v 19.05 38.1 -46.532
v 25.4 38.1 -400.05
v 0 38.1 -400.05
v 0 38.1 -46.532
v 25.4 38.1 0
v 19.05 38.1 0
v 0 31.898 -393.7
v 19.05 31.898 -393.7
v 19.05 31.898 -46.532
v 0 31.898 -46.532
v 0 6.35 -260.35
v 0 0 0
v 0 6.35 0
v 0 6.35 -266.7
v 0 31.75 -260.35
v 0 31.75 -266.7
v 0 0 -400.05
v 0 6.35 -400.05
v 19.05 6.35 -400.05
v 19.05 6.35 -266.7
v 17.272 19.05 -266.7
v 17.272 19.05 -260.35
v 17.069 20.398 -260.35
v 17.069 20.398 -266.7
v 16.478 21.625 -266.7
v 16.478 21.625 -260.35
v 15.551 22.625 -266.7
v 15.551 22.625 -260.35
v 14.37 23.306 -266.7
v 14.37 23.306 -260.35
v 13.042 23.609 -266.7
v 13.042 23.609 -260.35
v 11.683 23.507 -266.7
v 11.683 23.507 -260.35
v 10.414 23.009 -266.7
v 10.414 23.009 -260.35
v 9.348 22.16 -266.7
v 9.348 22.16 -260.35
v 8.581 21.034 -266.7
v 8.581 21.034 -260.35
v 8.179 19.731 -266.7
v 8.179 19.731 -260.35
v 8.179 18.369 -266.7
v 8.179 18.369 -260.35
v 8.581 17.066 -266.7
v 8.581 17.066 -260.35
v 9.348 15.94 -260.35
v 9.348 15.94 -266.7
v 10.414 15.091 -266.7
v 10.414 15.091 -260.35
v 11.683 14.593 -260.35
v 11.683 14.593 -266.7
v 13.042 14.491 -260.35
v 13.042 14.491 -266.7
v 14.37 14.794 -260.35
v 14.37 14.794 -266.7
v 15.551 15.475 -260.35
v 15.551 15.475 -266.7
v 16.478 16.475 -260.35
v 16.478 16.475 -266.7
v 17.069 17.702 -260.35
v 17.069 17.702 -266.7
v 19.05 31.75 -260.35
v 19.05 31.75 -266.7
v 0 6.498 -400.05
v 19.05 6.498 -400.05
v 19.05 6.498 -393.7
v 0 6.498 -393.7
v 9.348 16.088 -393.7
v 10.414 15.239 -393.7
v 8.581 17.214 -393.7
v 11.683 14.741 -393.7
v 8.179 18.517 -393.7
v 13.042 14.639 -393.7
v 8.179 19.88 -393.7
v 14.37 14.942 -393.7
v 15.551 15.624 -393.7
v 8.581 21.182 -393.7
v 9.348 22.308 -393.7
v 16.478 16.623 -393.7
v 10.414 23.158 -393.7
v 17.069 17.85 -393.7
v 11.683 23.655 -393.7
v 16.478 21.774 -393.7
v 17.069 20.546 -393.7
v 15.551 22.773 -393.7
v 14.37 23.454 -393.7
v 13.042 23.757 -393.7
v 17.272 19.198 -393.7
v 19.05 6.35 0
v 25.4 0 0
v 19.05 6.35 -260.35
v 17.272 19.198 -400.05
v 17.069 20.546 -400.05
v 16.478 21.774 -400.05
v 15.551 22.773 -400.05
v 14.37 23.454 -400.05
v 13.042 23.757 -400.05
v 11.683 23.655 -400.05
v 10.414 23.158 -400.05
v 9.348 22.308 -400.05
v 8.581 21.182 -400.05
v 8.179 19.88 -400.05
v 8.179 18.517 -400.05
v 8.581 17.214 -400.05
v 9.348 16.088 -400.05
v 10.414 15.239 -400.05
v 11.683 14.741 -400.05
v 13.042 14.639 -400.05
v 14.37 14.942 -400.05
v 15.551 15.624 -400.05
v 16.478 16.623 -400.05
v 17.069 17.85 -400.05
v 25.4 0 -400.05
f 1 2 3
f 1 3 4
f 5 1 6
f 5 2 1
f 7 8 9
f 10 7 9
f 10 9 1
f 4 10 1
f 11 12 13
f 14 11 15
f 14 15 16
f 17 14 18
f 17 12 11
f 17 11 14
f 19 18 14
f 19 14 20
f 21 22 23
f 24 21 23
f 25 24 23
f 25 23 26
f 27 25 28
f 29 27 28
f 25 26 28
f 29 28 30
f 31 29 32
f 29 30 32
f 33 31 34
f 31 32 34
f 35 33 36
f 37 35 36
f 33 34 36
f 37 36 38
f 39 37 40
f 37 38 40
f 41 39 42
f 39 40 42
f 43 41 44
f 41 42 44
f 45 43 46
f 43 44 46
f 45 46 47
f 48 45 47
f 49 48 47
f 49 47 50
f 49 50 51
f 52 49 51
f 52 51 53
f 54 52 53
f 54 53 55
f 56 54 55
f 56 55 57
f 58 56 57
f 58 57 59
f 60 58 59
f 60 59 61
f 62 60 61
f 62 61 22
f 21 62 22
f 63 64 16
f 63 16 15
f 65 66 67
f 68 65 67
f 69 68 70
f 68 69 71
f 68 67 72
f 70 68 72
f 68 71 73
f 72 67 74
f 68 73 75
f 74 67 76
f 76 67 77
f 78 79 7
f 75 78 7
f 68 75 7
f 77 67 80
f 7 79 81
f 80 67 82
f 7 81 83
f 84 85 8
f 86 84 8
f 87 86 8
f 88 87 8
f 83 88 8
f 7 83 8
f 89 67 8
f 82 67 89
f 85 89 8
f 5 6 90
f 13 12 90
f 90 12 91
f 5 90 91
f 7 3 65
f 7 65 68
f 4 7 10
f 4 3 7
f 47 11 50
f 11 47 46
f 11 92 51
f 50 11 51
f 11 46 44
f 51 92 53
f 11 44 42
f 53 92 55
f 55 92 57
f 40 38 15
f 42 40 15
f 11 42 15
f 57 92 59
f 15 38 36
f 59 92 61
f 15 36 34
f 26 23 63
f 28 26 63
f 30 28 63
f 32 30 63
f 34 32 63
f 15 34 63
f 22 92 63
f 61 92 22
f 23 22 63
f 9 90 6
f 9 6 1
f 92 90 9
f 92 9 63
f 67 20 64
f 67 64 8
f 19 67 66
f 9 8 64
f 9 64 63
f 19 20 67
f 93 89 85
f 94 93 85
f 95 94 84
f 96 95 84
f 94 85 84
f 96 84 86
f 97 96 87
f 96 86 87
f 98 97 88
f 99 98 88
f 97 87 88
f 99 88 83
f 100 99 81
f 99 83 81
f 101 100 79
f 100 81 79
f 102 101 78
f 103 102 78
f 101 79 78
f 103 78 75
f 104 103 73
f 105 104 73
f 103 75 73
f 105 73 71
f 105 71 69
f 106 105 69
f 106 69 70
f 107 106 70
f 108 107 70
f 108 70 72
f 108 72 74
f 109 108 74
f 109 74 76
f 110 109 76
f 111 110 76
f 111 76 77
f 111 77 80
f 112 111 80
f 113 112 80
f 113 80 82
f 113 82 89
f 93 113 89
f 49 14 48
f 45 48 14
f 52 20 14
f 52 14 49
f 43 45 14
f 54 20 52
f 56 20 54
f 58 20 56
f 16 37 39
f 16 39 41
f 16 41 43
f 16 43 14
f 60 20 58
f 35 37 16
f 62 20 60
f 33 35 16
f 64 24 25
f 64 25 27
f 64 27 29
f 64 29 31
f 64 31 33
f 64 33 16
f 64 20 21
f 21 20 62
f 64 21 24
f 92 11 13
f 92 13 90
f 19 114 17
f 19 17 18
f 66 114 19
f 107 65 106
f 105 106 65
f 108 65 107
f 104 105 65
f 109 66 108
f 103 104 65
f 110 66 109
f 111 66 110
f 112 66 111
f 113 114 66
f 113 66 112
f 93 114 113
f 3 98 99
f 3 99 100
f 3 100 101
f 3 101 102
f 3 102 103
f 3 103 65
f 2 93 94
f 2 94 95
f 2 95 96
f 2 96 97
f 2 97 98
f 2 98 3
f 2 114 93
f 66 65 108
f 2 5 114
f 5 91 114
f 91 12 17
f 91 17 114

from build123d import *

# Parameters (mm, degrees)
SKETCH2_W           = 25.4
SKETCH2_H           = 400.05
BOSS_EXTRUDE1_DEPTH = 6.35
SKETCH4_W           = 6.35
SKETCH4_H           = 400.05
BOSS_EXTRUDE2_DEPTH = 31.75
SKETCH10_W          = 6.35
SKETCH10_H          = 25.4
BOSS_EXTRUDE6_DEPTH = 19.05
SKETCH12_R          = 4.572
CUT_EXTRUDE3_DEPTH  = 19.05
SKETCH14_W          = 6.35
SKETCH14_H          = 25.4
BOSS_EXTRUDE7_DEPTH = 19.05
SKETCH15_R          = 4.572
CUT_EXTRUDE4_DEPTH  = 19.05
SKETCH16_W          = 353.518259368
SKETCH16_H          = 6.201883549
BOSS_EXTRUDE8_DEPTH = 19.05


with BuildPart() as part:
    # Sketch2 → Boss-Extrude1 (new body)
    with BuildSketch(Plane(origin=(0, 0, 0), x_dir=(1, 0, 0), z_dir=(0, 1, 0))):
        with Locations((12.7, 200.025)):
            Rectangle(SKETCH2_W, SKETCH2_H)
    extrude(amount=BOSS_EXTRUDE1_DEPTH)

    # Sketch4 → Boss-Extrude2 (add)
    with BuildSketch(Plane(origin=(0, 6.35, 0), x_dir=(1, 0, 0), z_dir=(0, 1, 0))):
        with Locations((22.225, 200.025)):
            Rectangle(SKETCH4_W, SKETCH4_H)
    extrude(amount=BOSS_EXTRUDE2_DEPTH)

    # Sketch10 → Boss-Extrude6 (add)
    with BuildSketch(Plane.ZY.offset(-19.05)):
        with Locations((-396.875, 19.198116451)):
            Rectangle(SKETCH10_W, SKETCH10_H)
    extrude(amount=BOSS_EXTRUDE6_DEPTH)

    # Sketch12 → Cut-Extrude3 (cut)
    with BuildSketch(Plane.XY.offset(-393.7)):
        with Locations((12.7, 19.198116451)):
            Circle(SKETCH12_R)
    extrude(amount=-CUT_EXTRUDE3_DEPTH, mode=Mode.SUBTRACT)

    # Sketch14 → Boss-Extrude7 (add)
    with BuildSketch(Plane.ZY.offset(-19.05)):
        with Locations((-263.525, 19.05)):
            Rectangle(SKETCH14_W, SKETCH14_H)
    extrude(amount=BOSS_EXTRUDE7_DEPTH)

    # Sketch15 → Cut-Extrude4 (cut)
    with BuildSketch(Plane.XY.offset(-260.35)):
        with Locations((12.7, 19.05)):
            Circle(SKETCH15_R)
    extrude(amount=-CUT_EXTRUDE4_DEPTH, mode=Mode.SUBTRACT)

    # Sketch16 → Boss-Extrude8 (add)
    with BuildSketch(Plane.ZY.offset(-19.05)):
        with Locations((-223.290870316, 34.999058226)):
            Rectangle(SKETCH16_W, SKETCH16_H)
    extrude(amount=BOSS_EXTRUDE8_DEPTH)


solid = part.part
